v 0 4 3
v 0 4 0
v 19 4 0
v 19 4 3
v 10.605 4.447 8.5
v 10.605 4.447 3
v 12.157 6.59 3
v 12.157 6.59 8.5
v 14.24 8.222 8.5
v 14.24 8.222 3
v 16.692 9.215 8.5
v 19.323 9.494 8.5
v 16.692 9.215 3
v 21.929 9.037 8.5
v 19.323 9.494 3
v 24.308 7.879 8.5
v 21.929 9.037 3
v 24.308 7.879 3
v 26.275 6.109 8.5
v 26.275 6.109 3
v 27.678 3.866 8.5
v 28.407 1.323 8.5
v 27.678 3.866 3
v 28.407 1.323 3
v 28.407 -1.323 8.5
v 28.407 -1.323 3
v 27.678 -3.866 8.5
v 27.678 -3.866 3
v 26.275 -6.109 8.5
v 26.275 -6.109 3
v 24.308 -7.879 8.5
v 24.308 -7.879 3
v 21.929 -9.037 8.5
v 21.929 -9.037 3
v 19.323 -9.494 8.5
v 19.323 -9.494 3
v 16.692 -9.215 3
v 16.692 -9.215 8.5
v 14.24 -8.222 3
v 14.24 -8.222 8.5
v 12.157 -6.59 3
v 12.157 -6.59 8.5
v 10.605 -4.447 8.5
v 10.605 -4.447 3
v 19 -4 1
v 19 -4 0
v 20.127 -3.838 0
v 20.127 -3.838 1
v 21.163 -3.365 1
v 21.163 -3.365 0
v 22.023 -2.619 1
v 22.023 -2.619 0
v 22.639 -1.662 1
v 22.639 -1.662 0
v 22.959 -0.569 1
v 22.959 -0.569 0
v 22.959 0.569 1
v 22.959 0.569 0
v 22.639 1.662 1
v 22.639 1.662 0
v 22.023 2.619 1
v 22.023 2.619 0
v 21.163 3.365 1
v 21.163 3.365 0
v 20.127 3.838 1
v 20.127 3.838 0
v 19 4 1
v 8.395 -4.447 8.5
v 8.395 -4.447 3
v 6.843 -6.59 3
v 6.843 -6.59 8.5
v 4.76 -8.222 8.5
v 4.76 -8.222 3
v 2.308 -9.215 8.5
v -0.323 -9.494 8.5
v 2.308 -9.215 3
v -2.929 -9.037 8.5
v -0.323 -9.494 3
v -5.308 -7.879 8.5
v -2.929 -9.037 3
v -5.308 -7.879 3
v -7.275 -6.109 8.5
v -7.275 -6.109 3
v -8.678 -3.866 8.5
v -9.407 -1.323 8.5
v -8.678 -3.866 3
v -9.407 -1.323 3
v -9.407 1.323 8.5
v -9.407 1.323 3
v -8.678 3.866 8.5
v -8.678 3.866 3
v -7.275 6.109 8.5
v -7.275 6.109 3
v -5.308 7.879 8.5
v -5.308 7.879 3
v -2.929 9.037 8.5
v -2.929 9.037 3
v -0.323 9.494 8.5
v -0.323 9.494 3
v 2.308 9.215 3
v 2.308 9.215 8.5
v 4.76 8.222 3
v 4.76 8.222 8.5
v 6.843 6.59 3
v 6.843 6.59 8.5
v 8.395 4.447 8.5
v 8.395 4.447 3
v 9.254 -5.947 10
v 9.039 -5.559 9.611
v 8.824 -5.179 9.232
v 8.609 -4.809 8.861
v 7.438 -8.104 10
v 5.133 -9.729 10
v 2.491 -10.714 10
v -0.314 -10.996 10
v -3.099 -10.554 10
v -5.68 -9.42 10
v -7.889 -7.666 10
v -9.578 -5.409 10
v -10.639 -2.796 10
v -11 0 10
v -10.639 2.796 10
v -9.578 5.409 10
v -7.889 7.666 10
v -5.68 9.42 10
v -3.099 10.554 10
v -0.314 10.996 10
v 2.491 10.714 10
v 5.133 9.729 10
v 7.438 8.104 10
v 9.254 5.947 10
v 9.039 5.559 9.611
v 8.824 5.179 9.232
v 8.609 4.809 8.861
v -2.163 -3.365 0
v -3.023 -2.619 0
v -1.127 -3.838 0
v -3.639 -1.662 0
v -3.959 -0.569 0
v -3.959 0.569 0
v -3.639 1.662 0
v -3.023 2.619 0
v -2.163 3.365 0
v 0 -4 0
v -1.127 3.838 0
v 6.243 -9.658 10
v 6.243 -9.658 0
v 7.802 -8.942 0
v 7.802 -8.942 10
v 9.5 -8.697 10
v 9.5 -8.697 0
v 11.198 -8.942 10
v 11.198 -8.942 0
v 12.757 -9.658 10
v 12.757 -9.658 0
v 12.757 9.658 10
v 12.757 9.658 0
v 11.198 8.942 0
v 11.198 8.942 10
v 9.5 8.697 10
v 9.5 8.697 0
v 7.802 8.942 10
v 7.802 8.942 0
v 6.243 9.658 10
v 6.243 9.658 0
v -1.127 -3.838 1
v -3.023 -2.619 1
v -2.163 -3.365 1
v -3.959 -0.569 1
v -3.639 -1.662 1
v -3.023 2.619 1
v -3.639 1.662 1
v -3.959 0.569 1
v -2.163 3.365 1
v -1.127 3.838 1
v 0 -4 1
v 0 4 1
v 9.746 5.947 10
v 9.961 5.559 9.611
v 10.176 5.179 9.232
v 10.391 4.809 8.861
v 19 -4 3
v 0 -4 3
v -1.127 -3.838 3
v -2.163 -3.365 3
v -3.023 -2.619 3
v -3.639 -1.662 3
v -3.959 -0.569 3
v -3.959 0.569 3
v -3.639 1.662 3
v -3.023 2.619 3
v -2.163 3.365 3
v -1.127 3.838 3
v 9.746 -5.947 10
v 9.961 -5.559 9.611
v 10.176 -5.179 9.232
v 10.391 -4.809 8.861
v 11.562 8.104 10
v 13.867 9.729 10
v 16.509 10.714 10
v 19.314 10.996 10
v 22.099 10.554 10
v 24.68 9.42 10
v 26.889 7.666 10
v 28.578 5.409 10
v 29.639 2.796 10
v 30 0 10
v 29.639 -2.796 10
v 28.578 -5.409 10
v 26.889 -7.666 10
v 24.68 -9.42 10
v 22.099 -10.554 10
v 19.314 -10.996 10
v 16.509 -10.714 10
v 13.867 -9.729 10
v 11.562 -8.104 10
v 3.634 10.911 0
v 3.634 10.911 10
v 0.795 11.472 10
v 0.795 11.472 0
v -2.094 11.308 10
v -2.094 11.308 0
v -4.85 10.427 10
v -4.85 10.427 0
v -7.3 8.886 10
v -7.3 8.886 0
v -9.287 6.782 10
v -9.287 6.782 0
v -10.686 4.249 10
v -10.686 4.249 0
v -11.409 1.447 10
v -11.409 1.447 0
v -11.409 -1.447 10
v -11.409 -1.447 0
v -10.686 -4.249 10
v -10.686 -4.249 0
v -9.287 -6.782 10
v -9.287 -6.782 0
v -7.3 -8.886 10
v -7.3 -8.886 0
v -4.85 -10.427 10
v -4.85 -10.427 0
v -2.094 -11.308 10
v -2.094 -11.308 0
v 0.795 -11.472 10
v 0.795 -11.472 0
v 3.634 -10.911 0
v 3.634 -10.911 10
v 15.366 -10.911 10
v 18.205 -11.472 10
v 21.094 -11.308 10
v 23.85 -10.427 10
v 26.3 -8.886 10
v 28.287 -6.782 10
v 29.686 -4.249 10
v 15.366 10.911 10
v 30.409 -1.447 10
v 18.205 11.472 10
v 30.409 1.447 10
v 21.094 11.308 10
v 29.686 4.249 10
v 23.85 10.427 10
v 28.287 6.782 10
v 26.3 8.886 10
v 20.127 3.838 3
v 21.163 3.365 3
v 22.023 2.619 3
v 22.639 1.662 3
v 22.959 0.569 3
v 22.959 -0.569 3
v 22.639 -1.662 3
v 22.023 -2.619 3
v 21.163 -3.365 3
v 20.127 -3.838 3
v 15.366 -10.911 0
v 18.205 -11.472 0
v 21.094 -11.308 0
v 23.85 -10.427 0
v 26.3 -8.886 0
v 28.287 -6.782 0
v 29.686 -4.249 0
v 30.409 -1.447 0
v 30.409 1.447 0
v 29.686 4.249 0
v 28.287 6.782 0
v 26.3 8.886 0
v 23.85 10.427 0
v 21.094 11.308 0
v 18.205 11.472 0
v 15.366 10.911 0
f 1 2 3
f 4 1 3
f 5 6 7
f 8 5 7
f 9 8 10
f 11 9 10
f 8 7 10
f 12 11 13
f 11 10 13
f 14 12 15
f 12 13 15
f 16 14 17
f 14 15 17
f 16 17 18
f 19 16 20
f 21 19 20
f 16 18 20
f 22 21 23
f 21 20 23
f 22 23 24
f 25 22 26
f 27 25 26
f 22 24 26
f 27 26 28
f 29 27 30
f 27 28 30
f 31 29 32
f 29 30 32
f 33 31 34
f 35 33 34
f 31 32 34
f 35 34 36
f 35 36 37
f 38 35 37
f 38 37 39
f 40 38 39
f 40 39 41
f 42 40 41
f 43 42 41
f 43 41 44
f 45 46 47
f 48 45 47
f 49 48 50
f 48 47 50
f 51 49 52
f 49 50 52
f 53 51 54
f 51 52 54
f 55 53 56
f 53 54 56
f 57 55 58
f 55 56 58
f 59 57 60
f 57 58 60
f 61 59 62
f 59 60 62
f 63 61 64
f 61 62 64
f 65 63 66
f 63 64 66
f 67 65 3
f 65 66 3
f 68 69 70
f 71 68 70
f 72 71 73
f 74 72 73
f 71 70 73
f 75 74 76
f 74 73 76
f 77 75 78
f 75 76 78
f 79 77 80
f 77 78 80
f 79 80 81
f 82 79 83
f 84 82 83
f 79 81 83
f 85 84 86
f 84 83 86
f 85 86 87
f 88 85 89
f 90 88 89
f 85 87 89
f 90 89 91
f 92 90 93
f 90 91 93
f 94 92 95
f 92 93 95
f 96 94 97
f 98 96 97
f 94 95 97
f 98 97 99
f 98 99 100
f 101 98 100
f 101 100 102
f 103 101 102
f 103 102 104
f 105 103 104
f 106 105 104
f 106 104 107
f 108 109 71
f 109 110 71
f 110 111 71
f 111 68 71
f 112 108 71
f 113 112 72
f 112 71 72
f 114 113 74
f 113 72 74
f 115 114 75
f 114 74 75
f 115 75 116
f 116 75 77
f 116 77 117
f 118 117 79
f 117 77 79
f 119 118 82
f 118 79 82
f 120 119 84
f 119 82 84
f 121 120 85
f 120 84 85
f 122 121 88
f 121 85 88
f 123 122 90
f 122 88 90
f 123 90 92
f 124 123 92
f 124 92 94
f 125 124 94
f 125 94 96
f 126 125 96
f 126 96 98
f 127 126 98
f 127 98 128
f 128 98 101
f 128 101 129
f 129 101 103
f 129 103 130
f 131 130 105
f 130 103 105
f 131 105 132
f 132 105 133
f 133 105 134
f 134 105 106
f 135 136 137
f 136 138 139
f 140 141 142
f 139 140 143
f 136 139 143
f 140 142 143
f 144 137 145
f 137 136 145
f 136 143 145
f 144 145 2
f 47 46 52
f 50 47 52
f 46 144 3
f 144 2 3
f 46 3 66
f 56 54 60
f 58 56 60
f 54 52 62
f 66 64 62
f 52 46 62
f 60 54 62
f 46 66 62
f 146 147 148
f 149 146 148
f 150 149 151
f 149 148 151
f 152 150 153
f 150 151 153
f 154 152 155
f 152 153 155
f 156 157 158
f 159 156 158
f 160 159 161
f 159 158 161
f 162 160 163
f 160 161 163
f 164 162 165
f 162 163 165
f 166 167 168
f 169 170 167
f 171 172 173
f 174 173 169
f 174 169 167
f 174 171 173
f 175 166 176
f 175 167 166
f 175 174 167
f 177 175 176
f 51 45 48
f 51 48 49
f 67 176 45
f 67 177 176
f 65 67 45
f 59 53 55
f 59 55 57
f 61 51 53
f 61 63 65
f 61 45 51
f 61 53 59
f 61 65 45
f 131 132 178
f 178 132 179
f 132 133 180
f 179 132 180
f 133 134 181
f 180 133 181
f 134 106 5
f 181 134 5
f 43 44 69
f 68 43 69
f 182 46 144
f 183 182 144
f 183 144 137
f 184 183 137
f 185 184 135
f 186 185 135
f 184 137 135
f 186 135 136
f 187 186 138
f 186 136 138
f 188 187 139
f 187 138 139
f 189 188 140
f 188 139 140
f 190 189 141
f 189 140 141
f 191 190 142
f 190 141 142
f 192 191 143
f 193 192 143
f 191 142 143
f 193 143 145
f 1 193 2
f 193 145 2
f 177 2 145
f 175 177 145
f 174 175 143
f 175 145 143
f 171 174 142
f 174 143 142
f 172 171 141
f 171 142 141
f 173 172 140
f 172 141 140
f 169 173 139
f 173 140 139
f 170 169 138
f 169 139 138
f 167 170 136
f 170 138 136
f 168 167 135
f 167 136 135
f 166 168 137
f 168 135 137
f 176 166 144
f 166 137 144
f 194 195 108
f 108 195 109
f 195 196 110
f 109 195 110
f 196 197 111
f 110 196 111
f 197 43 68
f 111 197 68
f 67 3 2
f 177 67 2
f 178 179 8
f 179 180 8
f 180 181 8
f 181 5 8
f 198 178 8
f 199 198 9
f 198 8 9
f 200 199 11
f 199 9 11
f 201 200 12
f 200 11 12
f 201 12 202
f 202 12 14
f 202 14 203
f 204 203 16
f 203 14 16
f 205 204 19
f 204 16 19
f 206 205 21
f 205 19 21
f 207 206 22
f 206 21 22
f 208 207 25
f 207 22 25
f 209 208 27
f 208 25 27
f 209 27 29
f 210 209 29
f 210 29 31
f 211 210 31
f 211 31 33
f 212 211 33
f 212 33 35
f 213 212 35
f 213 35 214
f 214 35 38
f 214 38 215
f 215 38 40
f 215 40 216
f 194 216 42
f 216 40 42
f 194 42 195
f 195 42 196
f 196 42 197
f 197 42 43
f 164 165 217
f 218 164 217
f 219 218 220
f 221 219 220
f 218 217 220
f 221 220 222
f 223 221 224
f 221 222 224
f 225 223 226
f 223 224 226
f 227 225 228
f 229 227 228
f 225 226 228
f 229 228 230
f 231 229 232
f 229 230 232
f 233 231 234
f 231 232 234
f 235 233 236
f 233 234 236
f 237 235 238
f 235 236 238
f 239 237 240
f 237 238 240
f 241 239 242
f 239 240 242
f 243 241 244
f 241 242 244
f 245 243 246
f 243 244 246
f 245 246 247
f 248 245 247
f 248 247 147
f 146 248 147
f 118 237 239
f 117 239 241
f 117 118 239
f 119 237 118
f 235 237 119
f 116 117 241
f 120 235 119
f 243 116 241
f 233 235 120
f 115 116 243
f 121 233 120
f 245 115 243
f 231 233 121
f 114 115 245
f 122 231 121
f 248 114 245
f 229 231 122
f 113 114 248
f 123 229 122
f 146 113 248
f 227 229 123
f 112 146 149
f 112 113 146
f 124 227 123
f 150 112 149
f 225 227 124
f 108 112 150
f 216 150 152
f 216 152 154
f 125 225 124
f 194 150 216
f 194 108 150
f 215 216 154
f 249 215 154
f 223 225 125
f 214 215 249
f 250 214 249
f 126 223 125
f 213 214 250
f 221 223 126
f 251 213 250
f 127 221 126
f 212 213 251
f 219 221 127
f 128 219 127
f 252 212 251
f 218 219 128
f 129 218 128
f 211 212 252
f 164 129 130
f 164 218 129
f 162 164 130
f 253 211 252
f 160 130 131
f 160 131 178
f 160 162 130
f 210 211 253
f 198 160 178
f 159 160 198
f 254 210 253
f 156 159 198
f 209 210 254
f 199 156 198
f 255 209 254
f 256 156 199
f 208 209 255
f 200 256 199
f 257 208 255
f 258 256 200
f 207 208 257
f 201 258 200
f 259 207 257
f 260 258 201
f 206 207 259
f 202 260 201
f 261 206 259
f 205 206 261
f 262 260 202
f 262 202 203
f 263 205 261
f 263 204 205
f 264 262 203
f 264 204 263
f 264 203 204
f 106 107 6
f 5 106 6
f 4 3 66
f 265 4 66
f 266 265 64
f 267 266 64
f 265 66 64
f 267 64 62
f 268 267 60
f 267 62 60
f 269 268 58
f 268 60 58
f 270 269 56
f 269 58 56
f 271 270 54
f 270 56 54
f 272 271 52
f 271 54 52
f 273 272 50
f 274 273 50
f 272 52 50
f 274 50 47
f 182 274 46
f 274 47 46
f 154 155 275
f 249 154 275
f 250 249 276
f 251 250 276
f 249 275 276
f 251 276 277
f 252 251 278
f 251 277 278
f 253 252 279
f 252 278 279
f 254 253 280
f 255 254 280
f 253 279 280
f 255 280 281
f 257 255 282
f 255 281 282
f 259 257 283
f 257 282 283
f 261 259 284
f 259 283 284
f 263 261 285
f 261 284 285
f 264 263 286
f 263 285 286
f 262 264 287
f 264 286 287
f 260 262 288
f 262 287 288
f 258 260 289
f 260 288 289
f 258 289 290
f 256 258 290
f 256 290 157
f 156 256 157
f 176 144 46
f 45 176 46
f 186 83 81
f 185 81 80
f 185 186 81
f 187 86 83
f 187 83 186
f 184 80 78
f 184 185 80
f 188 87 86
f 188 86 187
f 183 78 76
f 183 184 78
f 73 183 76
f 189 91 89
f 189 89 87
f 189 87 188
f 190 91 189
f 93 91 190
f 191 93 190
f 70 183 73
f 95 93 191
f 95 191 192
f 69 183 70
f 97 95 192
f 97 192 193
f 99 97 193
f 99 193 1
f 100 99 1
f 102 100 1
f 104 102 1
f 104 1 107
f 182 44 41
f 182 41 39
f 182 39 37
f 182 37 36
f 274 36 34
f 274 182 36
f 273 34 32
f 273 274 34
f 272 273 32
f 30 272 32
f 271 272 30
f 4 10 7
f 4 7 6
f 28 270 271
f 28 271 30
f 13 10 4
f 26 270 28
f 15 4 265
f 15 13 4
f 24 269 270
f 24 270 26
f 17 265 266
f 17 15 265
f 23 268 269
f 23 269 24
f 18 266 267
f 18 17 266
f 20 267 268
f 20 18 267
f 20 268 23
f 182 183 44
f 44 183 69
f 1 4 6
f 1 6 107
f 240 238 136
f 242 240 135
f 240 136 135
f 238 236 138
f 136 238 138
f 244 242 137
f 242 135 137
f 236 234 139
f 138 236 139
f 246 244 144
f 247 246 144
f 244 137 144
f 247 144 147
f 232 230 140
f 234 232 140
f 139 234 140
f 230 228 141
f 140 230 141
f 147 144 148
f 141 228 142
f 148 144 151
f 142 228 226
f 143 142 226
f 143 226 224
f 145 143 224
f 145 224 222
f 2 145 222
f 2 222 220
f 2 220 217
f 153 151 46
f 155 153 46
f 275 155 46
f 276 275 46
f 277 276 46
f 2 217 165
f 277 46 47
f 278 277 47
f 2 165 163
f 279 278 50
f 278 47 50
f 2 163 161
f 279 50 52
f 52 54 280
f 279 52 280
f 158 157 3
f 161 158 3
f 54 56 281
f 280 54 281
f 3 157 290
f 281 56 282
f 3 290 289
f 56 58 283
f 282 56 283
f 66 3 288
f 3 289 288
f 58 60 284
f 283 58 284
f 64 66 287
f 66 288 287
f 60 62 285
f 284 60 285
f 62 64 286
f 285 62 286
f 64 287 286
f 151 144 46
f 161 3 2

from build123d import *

# Parameters (mm, degrees)
F1_DEPTH = 1
F2_DEPTH = 3
F3_DEPTH = 10
F4_SIZE  = 1.5


with BuildPart() as f1:
    # F0 (on Top) → F1 (new body)
    with BuildSketch(Plane.XY):
        with BuildLine():
            Line((19, 4), (0, 4))
            ThreePointArc((0, 4), (-4, 0), (0, -4))
            Line((0, -4), (19, -4))
            ThreePointArc((19, -4), (23, 0), (19, 4))
        make_face()
    extrude(amount=F1_DEPTH)


with BuildPart() as f2:
    # F0 (on Top) → F2 (new body)
    with BuildSketch(Plane.XY):
        with BuildLine():
            Line((10.605263, 4.447291), (8.394737, 4.447291))
            ThreePointArc((8.394737, 4.447291), (-9.5, 0), (8.394737, -4.447291))
            Line((8.394737, -4.447291), (10.605263, -4.447291))
            ThreePointArc((10.605263, -4.447291), (28.5, 0), (10.605263, 4.447291))
        make_face()
        with BuildLine():
            ThreePointArc((0, -4), (-4, 0), (0, 4))
            Line((0, 4), (19, 4))
            ThreePointArc((19, 4), (23, 0), (19, -4))
            Line((19, -4), (0, -4))
        make_face(mode=Mode.SUBTRACT)
    extrude(amount=F2_DEPTH)

    # F0 (on Top) → F3 (join)
    with BuildSketch(Plane.XY):
        with BuildLine():
            ThreePointArc((12.757143, 9.657988), (9.5, 8.696938), (6.242857, 9.657988))
            ThreePointArc((6.242857, 9.657988), (-11.5, 0), (6.242857, -9.657988))
            ThreePointArc((6.242857, -9.657988), (9.5, -8.696938), (12.757143, -9.657988))
            ThreePointArc((12.757143, -9.657988), (30.5, 0), (12.757143, 9.657988))
        make_face()
        with BuildLine():
            ThreePointArc((8.394737, -4.447291), (-9.5, 0), (8.394737, 4.447291))
            Line((8.394737, 4.447291), (10.605263, 4.447291))
            ThreePointArc((10.605263, 4.447291), (28.5, 0), (10.605263, -4.447291))
            Line((10.605263, -4.447291), (8.394737, -4.447291))
        make_face(mode=Mode.SUBTRACT)
    extrude(amount=F3_DEPTH)

    # F4
    f4_edges = [f2.edges().sort_by_distance(p)[0] for p in [
        (-9.5, 0, 10),
        (28.5, 0, 10),
        (9.5, 4.447291, 10),
        (9.5, -4.447291, 10),
    ]]
    chamfer(f4_edges, length=F4_SIZE)


solid = Compound([f1.part, f2.part])
